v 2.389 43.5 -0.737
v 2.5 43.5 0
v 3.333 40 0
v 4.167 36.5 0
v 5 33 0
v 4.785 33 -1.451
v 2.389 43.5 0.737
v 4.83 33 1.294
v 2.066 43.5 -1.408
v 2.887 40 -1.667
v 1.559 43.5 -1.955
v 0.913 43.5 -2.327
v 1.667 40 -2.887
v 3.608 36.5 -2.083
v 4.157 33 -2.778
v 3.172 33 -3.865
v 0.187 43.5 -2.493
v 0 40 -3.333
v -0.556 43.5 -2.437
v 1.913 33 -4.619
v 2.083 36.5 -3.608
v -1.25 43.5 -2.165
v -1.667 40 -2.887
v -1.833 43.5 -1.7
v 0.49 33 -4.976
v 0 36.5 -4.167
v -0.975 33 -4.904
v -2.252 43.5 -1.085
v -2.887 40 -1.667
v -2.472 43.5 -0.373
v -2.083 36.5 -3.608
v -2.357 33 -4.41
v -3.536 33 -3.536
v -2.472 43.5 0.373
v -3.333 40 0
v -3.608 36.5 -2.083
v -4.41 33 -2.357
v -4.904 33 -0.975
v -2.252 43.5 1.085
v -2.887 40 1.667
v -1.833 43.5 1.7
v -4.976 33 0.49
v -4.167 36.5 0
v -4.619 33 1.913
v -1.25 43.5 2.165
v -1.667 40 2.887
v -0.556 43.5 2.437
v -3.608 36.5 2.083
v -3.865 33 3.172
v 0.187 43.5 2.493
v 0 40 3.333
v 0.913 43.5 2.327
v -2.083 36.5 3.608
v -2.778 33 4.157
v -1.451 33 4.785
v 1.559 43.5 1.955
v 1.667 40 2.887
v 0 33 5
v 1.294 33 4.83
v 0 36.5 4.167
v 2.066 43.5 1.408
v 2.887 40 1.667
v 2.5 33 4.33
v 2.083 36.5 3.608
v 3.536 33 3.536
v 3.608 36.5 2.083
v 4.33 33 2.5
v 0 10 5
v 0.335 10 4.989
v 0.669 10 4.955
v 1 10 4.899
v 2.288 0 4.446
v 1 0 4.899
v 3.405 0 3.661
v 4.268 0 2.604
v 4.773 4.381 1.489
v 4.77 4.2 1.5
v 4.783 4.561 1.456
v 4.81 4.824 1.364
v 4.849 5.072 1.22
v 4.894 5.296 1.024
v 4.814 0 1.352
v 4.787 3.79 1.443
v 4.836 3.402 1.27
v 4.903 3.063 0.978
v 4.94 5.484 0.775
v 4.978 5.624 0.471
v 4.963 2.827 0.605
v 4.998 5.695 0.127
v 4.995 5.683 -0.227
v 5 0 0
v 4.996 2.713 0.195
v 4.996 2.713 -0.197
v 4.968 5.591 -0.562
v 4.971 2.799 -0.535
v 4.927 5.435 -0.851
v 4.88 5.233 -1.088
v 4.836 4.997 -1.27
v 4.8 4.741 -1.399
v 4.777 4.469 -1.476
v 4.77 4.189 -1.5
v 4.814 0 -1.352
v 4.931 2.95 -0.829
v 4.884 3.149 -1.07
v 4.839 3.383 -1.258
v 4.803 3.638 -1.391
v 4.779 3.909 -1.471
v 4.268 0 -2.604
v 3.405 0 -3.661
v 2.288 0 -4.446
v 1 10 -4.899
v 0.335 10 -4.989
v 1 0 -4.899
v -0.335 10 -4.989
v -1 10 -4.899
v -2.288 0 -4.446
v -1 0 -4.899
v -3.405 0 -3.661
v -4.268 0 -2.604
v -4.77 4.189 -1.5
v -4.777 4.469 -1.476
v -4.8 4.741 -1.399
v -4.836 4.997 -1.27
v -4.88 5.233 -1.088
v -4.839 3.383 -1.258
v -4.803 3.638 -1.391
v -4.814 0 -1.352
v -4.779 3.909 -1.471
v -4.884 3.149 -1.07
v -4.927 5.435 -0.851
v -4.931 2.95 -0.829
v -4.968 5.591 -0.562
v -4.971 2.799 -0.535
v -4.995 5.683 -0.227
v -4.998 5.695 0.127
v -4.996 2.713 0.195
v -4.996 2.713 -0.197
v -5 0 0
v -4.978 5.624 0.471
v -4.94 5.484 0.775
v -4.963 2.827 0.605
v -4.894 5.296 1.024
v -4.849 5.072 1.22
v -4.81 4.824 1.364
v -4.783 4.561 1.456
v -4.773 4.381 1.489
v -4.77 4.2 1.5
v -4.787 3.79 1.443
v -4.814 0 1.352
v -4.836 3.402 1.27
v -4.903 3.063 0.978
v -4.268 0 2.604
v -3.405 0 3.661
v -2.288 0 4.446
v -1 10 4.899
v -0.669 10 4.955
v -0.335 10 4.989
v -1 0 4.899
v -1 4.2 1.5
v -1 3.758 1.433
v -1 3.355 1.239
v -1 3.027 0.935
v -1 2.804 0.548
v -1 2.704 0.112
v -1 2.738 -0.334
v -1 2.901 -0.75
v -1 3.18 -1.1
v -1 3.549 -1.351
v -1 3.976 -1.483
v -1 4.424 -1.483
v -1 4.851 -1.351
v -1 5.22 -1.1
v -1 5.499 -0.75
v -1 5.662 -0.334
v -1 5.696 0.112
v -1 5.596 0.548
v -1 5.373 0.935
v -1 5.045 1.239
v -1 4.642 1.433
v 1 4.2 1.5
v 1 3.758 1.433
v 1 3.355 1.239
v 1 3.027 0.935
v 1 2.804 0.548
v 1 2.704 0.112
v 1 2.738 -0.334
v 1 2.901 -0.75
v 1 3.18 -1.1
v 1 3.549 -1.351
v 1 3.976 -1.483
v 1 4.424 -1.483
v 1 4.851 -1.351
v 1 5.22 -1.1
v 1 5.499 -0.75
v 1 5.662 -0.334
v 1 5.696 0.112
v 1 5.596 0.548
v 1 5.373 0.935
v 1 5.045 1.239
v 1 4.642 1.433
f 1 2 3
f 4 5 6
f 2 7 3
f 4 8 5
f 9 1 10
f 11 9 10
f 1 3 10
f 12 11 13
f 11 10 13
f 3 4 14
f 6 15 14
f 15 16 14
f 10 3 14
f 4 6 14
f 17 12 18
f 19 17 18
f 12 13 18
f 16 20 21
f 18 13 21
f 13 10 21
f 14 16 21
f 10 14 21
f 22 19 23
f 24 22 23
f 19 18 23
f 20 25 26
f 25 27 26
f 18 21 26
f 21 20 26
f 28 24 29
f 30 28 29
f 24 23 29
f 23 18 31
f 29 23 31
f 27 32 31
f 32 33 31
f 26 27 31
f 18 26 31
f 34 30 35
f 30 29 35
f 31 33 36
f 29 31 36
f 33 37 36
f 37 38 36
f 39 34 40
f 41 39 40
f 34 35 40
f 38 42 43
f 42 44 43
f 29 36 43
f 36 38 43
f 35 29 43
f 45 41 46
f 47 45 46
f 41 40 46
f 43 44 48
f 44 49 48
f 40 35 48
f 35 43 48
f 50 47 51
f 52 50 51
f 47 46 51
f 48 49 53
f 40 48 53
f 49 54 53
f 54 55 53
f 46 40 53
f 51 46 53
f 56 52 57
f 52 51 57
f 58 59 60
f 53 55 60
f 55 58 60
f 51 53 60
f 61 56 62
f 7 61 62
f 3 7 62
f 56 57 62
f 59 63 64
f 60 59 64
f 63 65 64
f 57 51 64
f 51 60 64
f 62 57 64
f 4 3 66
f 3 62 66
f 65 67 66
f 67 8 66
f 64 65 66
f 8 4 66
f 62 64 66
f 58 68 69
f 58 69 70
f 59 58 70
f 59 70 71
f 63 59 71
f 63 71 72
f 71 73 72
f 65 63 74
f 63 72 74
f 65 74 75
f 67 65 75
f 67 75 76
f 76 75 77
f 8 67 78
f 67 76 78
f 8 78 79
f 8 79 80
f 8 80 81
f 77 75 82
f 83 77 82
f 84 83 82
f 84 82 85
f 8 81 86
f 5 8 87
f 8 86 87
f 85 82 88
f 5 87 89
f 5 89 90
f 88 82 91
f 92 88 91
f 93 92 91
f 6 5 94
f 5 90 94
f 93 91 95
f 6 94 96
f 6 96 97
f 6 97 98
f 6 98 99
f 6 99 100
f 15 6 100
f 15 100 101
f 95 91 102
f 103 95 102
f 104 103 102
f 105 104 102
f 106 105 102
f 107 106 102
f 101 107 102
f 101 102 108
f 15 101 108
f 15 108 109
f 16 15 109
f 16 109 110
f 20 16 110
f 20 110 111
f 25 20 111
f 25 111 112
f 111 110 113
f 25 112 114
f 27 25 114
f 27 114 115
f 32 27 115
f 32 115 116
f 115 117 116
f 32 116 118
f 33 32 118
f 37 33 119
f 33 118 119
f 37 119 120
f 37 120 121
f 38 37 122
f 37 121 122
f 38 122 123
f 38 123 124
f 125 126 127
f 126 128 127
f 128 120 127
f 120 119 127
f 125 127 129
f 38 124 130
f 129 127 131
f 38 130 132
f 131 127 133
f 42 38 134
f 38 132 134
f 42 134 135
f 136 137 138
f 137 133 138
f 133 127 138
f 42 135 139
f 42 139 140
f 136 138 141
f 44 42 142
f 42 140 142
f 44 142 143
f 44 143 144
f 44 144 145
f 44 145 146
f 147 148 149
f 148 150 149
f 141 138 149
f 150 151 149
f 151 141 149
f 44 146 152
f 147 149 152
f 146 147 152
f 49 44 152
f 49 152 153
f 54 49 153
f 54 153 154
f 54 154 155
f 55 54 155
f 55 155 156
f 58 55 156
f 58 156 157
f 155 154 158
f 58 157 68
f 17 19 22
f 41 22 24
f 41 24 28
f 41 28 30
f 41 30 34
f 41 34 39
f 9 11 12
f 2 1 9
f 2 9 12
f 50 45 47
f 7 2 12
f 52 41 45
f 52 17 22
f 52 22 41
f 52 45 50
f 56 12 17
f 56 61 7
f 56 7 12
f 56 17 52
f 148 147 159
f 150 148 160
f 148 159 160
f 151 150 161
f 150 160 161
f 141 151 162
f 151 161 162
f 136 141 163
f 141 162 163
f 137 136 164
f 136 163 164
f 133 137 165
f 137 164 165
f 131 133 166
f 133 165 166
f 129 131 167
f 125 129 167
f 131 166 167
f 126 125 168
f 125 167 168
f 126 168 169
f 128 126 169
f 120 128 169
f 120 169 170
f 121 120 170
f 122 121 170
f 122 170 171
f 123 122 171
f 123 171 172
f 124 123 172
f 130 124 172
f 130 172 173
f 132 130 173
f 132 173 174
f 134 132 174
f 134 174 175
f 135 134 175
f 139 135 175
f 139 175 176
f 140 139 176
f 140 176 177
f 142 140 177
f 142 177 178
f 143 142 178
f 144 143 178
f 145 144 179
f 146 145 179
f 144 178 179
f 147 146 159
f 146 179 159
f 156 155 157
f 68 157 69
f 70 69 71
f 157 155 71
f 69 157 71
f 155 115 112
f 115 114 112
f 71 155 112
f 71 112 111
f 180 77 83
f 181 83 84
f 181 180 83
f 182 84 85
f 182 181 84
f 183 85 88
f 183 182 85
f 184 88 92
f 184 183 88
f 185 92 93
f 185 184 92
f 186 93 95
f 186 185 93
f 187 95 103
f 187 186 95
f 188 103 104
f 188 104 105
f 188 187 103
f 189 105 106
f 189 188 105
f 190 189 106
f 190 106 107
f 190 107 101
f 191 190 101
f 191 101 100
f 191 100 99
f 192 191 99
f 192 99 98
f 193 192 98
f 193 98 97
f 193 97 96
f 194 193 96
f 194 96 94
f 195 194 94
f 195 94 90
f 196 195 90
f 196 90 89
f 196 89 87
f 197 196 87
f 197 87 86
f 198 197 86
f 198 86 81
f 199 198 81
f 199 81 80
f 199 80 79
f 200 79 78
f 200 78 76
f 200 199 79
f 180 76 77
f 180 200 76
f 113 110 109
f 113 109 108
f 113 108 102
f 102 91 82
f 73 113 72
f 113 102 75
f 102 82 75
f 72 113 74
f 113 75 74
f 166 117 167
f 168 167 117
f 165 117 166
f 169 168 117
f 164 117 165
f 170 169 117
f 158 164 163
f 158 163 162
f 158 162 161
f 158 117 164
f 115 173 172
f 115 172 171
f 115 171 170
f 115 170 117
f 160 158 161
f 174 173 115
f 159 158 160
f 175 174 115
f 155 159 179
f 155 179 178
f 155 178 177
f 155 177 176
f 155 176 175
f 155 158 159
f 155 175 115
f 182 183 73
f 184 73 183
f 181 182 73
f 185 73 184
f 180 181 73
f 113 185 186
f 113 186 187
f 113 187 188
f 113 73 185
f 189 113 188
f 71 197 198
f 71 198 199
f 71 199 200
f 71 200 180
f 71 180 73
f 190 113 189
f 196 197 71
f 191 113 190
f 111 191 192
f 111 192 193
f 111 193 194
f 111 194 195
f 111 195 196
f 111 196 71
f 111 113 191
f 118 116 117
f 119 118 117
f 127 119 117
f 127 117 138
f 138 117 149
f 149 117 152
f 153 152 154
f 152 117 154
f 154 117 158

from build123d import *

# Parameters (mm, degrees)
CROQUIS1_R                             = 5
SALIENTE_EXTRUIR1_DEPTH                = 43.5
CORTAR_EXTRUIR1_REACH                  = 46.071
CORTAR_EXTRUIR1_END_RADIUS             = 5
CROQUIS8_R                             = 1.5
CORTAR_EXTRUIR1_DIRECTION_2_REACH      = 46.071
CORTAR_EXTRUIR1_DIRECTION_2_END_RADIUS = 5
CORTAR_EXTRUIR2_REACH                  = 46.071
CROQUIS9_W                             = 2
CROQUIS9_H                             = 10
CORTAR_EXTRUIR2_DIRECTION_2_REACH      = 46.071


# Read off the part's stored shape, not the designer's step: Cortar-Revolución-Lámina1
with BuildPart() as part:
    # Croquis1 → Saliente-Extruir1 (new body)
    with BuildSketch(Plane(origin=(0, 0, 0), x_dir=(1, 0, 0), z_dir=(0, 1, 0))):
        with Locations(Location((0, 0, 0), (0, 0, 270))):
            Circle(CROQUIS1_R)
    extrude(amount=SALIENTE_EXTRUIR1_DEPTH)

    # Cortar-Revolución-Lámina1 outline → Cortar-Revolución-Lámina1 (revolve, cut)
    with BuildSketch(Plane.XY):
        Polygon((5, 43.5), (2.5, 43.5), (5, 33), align=None)
    revolve(axis=Axis((0, 0, 0), (0, 1, 0)), mode=Mode.SUBTRACT)

    # Cortar-Extruir1: up to this cylinder (the profile starts inside it)
    cortar_extruir1_end = Plane(origin=(0, 4.2, 0), z_dir=(0, -1, 0)) * Cylinder(CORTAR_EXTRUIR1_END_RADIUS, 103.142, mode=Mode.PRIVATE)
    # Croquis8 → Cortar-Extruir1 (cut, up to the surface)
    with BuildSketch(Plane(origin=(0, 0, 0), x_dir=(0, 0, -1), z_dir=(1, 0, 0)), mode=Mode.PRIVATE) as cortar_extruir1_sk1:
        with Locations(Location((0, 4.2, 0), (0, 0, 180))):
            Circle(CROQUIS8_R)
    cortar_extruir1_tool1 = extrude(cortar_extruir1_sk1.sketch, amount=-CORTAR_EXTRUIR1_REACH, mode=Mode.PRIVATE) & cortar_extruir1_end
    add(cortar_extruir1_tool1.solids().sort_by_distance((0, 4.2, 0))[0], mode=Mode.SUBTRACT)

    # Cortar-Extruir1 direction 2: up to this cylinder (the profile starts inside it)
    cortar_extruir1_direction_2_end = Plane(origin=(0, 4.2, 0), z_dir=(0, -1, 0)) * Cylinder(CORTAR_EXTRUIR1_DIRECTION_2_END_RADIUS, 103.142, mode=Mode.PRIVATE)
    # Croquis8 → Cortar-Extruir1 direction 2 (cut, up to the surface)
    with BuildSketch(Plane(origin=(0, 0, 0), x_dir=(0, 0, -1), z_dir=(1, 0, 0)), mode=Mode.PRIVATE) as cortar_extruir1_direction_2_sk1:
        with Locations(Location((0, 4.2, 0), (0, 0, 180))):
            Circle(CROQUIS8_R)
    cortar_extruir1_direction_2_tool1 = extrude(cortar_extruir1_direction_2_sk1.sketch, amount=CORTAR_EXTRUIR1_DIRECTION_2_REACH, mode=Mode.PRIVATE) & cortar_extruir1_direction_2_end
    add(cortar_extruir1_direction_2_tool1.solids().sort_by_distance((0, 4.2, 0))[0], mode=Mode.SUBTRACT)

    # Croquis9 → Cortar-Extruir2 (cut, up to next)
    with BuildSketch(Plane.XY, mode=Mode.PRIVATE) as cortar_extruir2_sk1:
        with Locations((0, 5)):
            Rectangle(CROQUIS9_W, CROQUIS9_H)
    cortar_extruir2_tool1 = extrude(cortar_extruir2_sk1.sketch, amount=-CORTAR_EXTRUIR2_REACH, mode=Mode.PRIVATE) & part.part
    add(cortar_extruir2_tool1.solids().sort_by_distance((0, 5, 0))[0], mode=Mode.SUBTRACT)

    # Croquis9 → Cortar-Extruir2 direction 2 (cut, up to next)
    with BuildSketch(Plane.XY, mode=Mode.PRIVATE) as cortar_extruir2_direction_2_sk1:
        with Locations((0, 5)):
            Rectangle(CROQUIS9_W, CROQUIS9_H)
    cortar_extruir2_direction_2_tool1 = extrude(cortar_extruir2_direction_2_sk1.sketch, amount=CORTAR_EXTRUIR2_DIRECTION_2_REACH, mode=Mode.PRIVATE) & part.part
    add(cortar_extruir2_direction_2_tool1.solids().sort_by_distance((0, 5, 0))[0], mode=Mode.SUBTRACT)


solid = part.part
